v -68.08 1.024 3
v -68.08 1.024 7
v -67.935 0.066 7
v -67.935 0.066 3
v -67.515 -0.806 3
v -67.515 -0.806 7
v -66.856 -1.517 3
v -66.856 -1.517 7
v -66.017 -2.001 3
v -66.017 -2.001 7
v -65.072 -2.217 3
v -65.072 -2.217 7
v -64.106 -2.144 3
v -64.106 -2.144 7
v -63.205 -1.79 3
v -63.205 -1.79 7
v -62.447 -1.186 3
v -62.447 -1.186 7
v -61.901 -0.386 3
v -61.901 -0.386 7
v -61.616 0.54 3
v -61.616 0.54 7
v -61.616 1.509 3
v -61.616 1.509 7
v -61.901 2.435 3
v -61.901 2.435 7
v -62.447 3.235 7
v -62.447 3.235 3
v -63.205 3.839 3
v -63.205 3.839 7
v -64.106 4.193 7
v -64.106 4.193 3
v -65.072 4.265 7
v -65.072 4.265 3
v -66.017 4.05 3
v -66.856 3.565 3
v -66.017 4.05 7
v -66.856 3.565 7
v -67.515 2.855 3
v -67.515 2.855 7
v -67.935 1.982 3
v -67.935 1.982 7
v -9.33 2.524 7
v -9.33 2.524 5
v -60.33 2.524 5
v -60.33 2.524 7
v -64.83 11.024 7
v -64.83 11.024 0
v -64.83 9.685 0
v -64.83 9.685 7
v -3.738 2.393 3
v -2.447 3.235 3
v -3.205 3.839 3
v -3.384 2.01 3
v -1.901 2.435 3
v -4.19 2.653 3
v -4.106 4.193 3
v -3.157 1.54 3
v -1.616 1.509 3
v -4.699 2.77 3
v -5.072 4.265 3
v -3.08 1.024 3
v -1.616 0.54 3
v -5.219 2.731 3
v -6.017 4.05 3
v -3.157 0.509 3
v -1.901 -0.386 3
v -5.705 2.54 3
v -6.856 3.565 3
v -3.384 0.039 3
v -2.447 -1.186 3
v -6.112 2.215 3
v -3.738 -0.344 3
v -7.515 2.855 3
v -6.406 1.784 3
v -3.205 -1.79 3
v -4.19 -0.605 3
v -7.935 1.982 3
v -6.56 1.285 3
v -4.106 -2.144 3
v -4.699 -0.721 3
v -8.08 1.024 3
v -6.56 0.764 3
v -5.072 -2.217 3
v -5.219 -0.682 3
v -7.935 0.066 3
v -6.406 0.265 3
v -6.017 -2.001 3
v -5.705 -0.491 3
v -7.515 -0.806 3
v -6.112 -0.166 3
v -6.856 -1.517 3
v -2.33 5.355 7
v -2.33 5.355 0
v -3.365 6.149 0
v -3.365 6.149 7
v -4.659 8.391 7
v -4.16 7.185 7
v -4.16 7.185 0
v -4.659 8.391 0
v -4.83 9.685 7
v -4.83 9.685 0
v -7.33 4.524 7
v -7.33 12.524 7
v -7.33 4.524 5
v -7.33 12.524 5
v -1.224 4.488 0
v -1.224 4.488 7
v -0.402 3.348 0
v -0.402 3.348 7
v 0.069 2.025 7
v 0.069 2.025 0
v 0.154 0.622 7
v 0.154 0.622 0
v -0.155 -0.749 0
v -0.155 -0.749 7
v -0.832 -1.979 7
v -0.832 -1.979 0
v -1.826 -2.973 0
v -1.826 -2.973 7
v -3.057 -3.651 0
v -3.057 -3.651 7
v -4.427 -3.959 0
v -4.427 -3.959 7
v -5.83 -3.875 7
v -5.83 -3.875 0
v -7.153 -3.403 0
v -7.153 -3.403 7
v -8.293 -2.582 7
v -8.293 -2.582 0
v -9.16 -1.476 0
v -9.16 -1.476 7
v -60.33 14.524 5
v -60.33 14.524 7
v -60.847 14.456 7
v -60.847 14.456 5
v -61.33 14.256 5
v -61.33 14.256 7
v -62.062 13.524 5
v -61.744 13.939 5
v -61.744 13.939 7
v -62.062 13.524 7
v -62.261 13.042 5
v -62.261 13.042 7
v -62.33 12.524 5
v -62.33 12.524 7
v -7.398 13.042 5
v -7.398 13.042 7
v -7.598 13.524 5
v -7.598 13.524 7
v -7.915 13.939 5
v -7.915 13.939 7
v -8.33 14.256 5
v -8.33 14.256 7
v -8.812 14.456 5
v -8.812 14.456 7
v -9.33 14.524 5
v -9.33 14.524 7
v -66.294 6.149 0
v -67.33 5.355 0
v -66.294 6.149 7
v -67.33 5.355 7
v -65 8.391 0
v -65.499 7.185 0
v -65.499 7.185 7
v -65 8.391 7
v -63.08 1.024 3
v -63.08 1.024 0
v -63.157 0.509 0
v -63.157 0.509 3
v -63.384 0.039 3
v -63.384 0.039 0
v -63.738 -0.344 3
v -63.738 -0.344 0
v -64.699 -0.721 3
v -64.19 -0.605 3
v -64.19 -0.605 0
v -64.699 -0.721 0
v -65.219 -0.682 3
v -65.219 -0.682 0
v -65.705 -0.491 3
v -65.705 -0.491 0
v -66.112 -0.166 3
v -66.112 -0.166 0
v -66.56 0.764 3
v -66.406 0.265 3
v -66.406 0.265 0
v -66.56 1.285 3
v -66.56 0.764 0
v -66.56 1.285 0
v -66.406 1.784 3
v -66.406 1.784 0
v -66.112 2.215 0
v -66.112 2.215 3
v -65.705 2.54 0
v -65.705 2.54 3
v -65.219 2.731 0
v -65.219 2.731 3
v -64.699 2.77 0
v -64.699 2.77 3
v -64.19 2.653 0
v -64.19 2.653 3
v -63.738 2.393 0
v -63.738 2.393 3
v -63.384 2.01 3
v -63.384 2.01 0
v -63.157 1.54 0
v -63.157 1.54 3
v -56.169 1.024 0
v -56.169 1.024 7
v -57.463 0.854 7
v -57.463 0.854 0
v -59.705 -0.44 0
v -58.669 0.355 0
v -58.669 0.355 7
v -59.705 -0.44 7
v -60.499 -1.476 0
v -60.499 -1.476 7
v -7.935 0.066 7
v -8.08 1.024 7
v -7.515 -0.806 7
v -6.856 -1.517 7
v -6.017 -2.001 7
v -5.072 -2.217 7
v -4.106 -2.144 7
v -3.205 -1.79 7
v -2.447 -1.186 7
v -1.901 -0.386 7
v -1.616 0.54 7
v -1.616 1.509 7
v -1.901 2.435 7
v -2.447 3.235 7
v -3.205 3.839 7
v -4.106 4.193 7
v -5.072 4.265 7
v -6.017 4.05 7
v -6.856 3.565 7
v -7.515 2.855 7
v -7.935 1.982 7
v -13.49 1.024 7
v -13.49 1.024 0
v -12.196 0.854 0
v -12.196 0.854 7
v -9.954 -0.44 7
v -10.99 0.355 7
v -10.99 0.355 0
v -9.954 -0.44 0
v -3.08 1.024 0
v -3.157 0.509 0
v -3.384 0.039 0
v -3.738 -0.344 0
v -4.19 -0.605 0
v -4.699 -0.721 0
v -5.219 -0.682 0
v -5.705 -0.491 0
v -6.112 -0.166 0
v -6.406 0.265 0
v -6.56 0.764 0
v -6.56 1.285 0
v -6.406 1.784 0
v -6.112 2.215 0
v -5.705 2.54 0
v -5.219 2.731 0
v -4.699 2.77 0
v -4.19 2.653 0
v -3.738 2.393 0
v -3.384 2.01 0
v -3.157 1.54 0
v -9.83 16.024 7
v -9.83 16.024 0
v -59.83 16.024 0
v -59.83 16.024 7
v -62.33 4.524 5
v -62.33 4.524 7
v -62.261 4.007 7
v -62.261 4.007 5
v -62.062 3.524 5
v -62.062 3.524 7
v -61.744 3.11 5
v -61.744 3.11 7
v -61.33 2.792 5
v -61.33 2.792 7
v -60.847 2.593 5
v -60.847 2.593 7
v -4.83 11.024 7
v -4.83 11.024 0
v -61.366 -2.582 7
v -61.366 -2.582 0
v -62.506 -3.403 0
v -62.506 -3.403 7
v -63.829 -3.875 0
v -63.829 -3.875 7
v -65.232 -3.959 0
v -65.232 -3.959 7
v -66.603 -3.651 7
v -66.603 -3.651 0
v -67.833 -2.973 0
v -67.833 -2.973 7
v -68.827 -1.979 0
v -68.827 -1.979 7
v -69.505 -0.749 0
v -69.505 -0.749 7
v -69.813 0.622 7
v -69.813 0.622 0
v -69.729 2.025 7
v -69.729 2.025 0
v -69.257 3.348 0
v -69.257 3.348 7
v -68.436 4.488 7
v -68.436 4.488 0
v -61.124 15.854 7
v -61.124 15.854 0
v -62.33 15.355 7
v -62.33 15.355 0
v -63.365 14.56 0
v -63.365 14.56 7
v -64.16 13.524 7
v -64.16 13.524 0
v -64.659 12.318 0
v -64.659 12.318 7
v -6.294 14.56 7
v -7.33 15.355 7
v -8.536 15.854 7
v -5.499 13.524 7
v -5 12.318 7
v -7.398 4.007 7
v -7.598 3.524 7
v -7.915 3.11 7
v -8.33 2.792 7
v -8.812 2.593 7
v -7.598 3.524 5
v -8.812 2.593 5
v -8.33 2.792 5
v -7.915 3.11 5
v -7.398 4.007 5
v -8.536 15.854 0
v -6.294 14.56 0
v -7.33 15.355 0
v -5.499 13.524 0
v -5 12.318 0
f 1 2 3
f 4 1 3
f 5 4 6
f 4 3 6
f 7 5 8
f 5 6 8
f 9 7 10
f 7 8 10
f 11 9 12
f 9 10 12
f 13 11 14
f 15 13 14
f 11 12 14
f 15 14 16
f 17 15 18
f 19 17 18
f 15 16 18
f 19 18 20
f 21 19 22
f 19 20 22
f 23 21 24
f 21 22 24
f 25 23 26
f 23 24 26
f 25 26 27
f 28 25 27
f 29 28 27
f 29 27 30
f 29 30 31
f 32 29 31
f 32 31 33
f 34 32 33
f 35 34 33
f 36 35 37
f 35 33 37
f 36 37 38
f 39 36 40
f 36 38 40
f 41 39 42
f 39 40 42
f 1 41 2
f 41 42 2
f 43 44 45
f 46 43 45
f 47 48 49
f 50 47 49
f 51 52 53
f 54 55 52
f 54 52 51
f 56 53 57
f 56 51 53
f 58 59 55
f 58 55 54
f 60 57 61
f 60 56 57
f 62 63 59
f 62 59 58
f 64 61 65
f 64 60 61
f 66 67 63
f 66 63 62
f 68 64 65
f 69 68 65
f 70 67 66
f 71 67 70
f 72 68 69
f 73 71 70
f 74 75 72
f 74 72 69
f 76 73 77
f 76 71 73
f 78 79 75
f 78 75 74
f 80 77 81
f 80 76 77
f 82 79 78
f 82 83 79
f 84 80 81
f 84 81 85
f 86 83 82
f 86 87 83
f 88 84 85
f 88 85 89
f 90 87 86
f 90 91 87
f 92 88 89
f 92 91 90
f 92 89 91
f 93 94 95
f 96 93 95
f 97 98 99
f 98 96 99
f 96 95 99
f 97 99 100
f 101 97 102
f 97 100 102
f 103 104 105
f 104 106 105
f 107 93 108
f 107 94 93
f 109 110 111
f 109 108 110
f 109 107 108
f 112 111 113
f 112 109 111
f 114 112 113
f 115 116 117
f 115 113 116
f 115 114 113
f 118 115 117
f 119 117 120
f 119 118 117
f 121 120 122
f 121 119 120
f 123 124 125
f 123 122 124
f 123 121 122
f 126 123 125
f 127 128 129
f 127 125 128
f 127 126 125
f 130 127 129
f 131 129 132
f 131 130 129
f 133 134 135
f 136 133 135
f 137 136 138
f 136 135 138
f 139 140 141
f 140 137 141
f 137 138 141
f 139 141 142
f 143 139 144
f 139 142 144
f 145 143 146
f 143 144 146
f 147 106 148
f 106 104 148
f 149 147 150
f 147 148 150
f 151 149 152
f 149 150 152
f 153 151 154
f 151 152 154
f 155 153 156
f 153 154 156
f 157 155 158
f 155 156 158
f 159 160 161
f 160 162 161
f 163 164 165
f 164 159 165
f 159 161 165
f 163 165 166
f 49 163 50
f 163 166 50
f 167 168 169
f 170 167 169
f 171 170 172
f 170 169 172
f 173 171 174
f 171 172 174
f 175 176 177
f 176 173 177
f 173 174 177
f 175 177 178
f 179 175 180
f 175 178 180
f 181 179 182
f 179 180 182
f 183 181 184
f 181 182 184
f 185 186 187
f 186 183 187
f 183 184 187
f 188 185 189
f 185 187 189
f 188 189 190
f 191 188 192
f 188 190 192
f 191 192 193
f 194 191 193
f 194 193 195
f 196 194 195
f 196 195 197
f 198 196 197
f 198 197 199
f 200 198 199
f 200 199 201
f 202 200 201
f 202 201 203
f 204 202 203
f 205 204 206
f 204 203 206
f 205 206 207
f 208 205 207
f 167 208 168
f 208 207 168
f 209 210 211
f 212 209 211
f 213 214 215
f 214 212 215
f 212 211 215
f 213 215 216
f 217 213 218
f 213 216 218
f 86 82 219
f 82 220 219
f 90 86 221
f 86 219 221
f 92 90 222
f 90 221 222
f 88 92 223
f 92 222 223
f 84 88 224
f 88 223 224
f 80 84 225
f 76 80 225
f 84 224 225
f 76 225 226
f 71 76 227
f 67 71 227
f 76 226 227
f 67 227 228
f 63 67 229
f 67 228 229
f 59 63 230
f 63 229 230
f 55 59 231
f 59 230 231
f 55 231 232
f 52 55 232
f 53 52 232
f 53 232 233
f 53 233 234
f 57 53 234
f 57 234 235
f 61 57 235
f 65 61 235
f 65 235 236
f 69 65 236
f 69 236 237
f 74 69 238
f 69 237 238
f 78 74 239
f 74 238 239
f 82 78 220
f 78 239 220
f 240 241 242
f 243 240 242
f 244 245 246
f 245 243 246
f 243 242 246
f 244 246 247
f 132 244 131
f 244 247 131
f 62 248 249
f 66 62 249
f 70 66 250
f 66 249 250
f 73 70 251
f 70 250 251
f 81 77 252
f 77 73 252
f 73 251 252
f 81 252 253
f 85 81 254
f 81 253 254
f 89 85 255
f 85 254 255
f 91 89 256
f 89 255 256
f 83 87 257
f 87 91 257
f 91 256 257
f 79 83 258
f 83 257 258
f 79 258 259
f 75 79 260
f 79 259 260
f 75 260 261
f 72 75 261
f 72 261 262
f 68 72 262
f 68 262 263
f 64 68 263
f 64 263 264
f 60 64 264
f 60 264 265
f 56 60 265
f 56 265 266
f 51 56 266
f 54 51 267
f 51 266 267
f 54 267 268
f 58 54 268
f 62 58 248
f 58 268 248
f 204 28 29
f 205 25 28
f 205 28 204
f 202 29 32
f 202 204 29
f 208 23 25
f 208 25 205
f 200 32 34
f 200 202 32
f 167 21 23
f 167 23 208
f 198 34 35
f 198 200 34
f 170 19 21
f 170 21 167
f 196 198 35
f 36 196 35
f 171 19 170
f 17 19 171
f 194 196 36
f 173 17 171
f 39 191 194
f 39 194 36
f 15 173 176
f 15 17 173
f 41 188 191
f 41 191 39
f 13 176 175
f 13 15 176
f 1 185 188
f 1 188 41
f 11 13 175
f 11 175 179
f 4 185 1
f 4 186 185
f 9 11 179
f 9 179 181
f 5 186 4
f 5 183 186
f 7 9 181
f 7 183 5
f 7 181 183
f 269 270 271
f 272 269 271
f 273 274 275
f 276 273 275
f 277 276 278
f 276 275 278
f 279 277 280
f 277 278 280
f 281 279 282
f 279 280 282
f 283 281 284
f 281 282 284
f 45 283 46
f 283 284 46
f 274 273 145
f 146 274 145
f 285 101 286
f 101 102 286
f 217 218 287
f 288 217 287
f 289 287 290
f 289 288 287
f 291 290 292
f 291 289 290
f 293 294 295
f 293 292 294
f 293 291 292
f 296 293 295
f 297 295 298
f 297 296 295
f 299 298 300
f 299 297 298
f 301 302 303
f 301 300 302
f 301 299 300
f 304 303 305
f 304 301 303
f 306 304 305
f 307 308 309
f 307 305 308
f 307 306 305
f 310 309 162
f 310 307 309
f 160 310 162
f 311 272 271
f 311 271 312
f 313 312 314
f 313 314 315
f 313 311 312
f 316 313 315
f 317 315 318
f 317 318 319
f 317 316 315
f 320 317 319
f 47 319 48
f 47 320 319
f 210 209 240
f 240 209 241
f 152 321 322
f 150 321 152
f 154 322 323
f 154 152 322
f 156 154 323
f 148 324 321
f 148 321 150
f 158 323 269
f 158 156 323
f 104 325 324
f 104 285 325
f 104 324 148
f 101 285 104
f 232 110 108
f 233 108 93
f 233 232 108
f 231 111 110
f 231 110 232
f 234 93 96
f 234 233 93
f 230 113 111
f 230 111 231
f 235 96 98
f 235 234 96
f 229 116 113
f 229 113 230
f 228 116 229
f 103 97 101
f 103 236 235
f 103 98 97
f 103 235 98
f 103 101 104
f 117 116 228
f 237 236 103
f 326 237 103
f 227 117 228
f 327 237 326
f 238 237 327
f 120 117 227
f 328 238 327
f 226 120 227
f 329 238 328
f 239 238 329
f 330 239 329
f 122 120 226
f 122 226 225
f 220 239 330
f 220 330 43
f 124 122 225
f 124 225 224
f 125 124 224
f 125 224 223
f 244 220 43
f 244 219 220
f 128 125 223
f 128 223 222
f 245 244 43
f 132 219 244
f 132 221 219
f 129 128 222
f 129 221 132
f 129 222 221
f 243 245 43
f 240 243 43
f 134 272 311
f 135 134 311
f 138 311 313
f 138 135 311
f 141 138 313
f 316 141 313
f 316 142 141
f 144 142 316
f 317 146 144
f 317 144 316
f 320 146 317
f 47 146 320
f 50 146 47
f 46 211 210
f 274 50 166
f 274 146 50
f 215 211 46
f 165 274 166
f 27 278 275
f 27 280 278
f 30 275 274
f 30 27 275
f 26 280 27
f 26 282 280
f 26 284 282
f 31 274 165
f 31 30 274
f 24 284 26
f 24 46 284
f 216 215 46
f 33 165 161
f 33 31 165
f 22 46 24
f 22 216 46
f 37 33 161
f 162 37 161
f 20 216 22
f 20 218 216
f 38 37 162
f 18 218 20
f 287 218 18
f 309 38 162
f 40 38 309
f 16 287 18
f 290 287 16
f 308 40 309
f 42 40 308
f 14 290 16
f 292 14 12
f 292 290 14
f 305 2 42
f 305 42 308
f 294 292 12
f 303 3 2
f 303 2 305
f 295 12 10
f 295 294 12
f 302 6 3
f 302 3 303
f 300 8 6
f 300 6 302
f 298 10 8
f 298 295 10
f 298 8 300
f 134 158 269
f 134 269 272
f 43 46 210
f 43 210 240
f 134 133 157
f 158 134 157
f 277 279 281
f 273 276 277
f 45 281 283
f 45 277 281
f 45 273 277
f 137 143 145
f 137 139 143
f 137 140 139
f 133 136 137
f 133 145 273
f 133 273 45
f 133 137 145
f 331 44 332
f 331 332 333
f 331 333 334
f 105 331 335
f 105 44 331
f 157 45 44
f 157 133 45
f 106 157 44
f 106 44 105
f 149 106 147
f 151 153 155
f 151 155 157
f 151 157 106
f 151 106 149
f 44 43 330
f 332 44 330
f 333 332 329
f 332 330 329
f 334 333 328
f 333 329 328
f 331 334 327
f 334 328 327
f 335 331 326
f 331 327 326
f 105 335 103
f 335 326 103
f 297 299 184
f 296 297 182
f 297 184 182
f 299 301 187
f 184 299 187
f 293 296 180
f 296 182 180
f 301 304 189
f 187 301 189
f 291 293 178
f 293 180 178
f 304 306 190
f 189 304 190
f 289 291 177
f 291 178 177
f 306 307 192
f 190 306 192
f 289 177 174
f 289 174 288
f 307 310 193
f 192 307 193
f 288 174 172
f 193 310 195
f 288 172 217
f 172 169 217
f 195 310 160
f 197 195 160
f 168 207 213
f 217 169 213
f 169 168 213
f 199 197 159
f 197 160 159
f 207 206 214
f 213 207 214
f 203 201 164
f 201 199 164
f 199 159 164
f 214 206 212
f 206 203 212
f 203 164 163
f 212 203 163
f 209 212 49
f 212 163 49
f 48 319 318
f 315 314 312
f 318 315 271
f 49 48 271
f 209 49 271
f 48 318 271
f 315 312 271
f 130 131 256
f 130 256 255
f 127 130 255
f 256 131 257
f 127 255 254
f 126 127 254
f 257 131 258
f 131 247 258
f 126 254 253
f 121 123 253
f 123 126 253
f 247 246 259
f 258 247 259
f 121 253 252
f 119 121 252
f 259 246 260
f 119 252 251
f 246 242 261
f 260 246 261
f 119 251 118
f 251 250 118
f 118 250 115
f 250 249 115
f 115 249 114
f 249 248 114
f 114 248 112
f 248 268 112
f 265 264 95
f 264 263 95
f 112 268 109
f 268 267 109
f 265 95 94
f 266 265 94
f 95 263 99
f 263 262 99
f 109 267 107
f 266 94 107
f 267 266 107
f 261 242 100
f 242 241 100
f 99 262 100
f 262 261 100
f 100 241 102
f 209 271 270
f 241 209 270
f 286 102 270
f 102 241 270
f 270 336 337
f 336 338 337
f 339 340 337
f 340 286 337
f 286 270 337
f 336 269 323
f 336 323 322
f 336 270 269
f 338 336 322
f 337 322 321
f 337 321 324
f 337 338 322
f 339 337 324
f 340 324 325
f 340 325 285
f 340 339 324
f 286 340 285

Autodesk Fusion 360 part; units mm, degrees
sketch "Sketch1" plane through (0, 0, 0) normal (0, 0, 1) x (1, 0, 0) in component "node_nametag"
  circle A0 centre (-64.8296, 1.0244) radius 1.75
  circle A1 centre (-4.8296, 1.0244) radius 1.75
  circle A2 centre (-64.8296, 1.0244) radius 5
  circle A3 centre (-4.8296, 1.0244) radius 5
  line L0 (-64.8296, 16.0244) -> (-4.8296, 16.0244)
  line L1 (-4.8296, 16.0244) -> (-4.8296, 1.0244)
  line L2 (-4.8296, 1.0244) -> (-64.8296, 1.0244)
  line L3 (-64.8296, 1.0244) -> (-64.8296, 16.0244)
  dimension "d1" = 3.5
  dimension "d2" = 3.5
  dimension "d3" = 60
  dimension "d4" = 10
  dimension "d5" = 10
  dimension "d6" = 15
extrude "Extrude1" add sketch "Sketch1" along normal blind 5 contours A0 A2 L2 L3 | A0 A2 L2 L3 | A2 A3 L0 L1 L2 L3 | A1 A3 L1 L2 | A1 A3 L1 L2 in component "node_nametag"
sketch "Sketch2" plane through (0, 0, 5) normal (0, 0, 1) x (-1, 0, 0) in component "node_nametag"
  circle A0 centre (4.8296, -1.0244) radius 1.75
  circle A1 centre (64.8296, -1.0244) radius 1.75
  line L0 (64.8296, -16.0244) -> (64.8296, -6.0244)
  arc A2 (64.8296, -6.0244) -> (59.8296, -1.0244) centre (64.8296, -1.0244) ccw
  line L1 (59.8296, -1.0244) -> (9.8296, -1.0244)
  arc A3 (9.8296, -1.0244) -> (4.8296, -6.0244) centre (4.8296, -1.0244) ccw
  line L2 (4.8296, -6.0244) -> (4.8296, -16.0244)
  line L3 (4.8296, -16.0244) -> (64.8296, -16.0244)
  line L4 (62.3296, -14.5244) -> (7.3296, -14.5244)
  line L5 (7.3296, -14.5244) -> (7.3296, -2.5244)
  line L6 (7.3296, -2.5244) -> (62.3296, -2.5244)
  line L7 (62.3296, -2.5244) -> (62.3296, -14.5244)
  line L8 (34.8296, -16.0244) -> (34.8296, -1.0244) construction
  line L9 (64.8296, -11.0244) -> (4.8296, -11.0244) construction
  dimension "d9" = 12
  dimension "d10" = 55
  dimension "d11" = 27.5
  dimension "d12" = 1.5
extrude "Extrude2" add sketch "Sketch2" along normal blind 2 in component "node_nametag"
fillet "Fillet1" radius 5 6 edges at (-4.8296, 16.0244, 3.5) (-64.8296, 16.0244, 3.5) (-59.8296, 1.0244, 3.5) (-9.8296, 1.0244, 3.5) (-64.8296, 6.0244, 3.5) (-4.8296, 6.0244, 3.5) in component "node_nametag"
fillet "Fillet1" radius 2 4 edges at (-62.3296, 14.5244, 6) (-62.3296, 2.5244, 6) (-7.3296, 2.5244, 6) (-7.3296, 14.5244, 6) in component "node_nametag"
sketch "Sketch3" plane through (0, 0, 7) normal (0, 0, 1) x (-1, 0, 0) in component "node_nametag"
  line L0 (9.3296, -2.5244) -> (60.3296, -2.5244)
  arc A0 (62.3296, -4.5244) -> (60.3296, -2.5244) centre (60.3296, -4.5244) ccw
  line L1 (62.3296, -4.5244) -> (62.3296, -12.5244)
  arc A1 (60.3296, -14.5244) -> (62.3296, -12.5244) centre (60.3296, -12.5244) ccw
  line L2 (60.3296, -14.5244) -> (9.3296, -14.5244)
  arc A2 (7.3296, -12.5244) -> (9.3296, -14.5244) centre (9.3296, -12.5244) ccw
  line L3 (7.3296, -12.5244) -> (7.3296, -4.5244)
  arc A3 (9.3296, -2.5244) -> (7.3296, -4.5244) centre (9.3296, -4.5244) ccw
  circle A4 centre (4.8296, -1.0244) radius 1.75
  circle A5 centre (64.8296, -1.0244) radius 1.75
  arc A6 (59.8296, -16.0244) -> (64.8296, -11.0244) centre (59.8296, -11.0244) ccw
  line L4 (64.8296, -11.0244) -> (64.8296, -9.6847)
  arc A7 (67.3296, -5.3546) -> (64.8296, -9.6847) centre (69.8296, -9.6847) ccw
  arc A8 (67.3296, -5.3546) -> (60.4995, 1.4756) centre (64.8296, -1.0244) ccw
  arc A9 (56.1694, -1.0244) -> (60.4995, 1.4756) centre (56.1694, 3.9756) ccw
  line L5 (56.1694, -1.0244) -> (13.4899, -1.0244)
  arc A10 (9.1597, 1.4756) -> (13.4899, -1.0244) centre (13.4899, 3.9756) ccw
  arc A11 (9.1597, 1.4756) -> (2.3296, -5.3546) centre (4.8296, -1.0244) ccw
  arc A12 (4.8296, -9.6847) -> (2.3296, -5.3546) centre (-0.1704, -9.6847) ccw
  line L6 (4.8296, -9.6847) -> (4.8296, -11.0244)
  arc A13 (4.8296, -11.0244) -> (9.8296, -16.0244) centre (9.8296, -11.0244) ccw
  line L7 (9.8296, -16.0244) -> (59.8296, -16.0244)
  circle A14 centre (4.8296, -1.0244) radius 3.25
  circle A15 centre (64.8296, -1.0244) radius 3.25
  dimension "d19" = 6.5
  dimension "d20" = 6.5
extrude "Extrude3" cut sketch "Sketch3" against normal blind 4 contours A14 | A15 in component "node_nametag"
component "node_nametag" placed x (1, 0, 0) y (0, 1, 0) z (0, 0, 1) at (0, 0, 0)
equation "d3 = ( 15 * 4 ) * 1 mm"
equation "d11 = d10 / 2"
